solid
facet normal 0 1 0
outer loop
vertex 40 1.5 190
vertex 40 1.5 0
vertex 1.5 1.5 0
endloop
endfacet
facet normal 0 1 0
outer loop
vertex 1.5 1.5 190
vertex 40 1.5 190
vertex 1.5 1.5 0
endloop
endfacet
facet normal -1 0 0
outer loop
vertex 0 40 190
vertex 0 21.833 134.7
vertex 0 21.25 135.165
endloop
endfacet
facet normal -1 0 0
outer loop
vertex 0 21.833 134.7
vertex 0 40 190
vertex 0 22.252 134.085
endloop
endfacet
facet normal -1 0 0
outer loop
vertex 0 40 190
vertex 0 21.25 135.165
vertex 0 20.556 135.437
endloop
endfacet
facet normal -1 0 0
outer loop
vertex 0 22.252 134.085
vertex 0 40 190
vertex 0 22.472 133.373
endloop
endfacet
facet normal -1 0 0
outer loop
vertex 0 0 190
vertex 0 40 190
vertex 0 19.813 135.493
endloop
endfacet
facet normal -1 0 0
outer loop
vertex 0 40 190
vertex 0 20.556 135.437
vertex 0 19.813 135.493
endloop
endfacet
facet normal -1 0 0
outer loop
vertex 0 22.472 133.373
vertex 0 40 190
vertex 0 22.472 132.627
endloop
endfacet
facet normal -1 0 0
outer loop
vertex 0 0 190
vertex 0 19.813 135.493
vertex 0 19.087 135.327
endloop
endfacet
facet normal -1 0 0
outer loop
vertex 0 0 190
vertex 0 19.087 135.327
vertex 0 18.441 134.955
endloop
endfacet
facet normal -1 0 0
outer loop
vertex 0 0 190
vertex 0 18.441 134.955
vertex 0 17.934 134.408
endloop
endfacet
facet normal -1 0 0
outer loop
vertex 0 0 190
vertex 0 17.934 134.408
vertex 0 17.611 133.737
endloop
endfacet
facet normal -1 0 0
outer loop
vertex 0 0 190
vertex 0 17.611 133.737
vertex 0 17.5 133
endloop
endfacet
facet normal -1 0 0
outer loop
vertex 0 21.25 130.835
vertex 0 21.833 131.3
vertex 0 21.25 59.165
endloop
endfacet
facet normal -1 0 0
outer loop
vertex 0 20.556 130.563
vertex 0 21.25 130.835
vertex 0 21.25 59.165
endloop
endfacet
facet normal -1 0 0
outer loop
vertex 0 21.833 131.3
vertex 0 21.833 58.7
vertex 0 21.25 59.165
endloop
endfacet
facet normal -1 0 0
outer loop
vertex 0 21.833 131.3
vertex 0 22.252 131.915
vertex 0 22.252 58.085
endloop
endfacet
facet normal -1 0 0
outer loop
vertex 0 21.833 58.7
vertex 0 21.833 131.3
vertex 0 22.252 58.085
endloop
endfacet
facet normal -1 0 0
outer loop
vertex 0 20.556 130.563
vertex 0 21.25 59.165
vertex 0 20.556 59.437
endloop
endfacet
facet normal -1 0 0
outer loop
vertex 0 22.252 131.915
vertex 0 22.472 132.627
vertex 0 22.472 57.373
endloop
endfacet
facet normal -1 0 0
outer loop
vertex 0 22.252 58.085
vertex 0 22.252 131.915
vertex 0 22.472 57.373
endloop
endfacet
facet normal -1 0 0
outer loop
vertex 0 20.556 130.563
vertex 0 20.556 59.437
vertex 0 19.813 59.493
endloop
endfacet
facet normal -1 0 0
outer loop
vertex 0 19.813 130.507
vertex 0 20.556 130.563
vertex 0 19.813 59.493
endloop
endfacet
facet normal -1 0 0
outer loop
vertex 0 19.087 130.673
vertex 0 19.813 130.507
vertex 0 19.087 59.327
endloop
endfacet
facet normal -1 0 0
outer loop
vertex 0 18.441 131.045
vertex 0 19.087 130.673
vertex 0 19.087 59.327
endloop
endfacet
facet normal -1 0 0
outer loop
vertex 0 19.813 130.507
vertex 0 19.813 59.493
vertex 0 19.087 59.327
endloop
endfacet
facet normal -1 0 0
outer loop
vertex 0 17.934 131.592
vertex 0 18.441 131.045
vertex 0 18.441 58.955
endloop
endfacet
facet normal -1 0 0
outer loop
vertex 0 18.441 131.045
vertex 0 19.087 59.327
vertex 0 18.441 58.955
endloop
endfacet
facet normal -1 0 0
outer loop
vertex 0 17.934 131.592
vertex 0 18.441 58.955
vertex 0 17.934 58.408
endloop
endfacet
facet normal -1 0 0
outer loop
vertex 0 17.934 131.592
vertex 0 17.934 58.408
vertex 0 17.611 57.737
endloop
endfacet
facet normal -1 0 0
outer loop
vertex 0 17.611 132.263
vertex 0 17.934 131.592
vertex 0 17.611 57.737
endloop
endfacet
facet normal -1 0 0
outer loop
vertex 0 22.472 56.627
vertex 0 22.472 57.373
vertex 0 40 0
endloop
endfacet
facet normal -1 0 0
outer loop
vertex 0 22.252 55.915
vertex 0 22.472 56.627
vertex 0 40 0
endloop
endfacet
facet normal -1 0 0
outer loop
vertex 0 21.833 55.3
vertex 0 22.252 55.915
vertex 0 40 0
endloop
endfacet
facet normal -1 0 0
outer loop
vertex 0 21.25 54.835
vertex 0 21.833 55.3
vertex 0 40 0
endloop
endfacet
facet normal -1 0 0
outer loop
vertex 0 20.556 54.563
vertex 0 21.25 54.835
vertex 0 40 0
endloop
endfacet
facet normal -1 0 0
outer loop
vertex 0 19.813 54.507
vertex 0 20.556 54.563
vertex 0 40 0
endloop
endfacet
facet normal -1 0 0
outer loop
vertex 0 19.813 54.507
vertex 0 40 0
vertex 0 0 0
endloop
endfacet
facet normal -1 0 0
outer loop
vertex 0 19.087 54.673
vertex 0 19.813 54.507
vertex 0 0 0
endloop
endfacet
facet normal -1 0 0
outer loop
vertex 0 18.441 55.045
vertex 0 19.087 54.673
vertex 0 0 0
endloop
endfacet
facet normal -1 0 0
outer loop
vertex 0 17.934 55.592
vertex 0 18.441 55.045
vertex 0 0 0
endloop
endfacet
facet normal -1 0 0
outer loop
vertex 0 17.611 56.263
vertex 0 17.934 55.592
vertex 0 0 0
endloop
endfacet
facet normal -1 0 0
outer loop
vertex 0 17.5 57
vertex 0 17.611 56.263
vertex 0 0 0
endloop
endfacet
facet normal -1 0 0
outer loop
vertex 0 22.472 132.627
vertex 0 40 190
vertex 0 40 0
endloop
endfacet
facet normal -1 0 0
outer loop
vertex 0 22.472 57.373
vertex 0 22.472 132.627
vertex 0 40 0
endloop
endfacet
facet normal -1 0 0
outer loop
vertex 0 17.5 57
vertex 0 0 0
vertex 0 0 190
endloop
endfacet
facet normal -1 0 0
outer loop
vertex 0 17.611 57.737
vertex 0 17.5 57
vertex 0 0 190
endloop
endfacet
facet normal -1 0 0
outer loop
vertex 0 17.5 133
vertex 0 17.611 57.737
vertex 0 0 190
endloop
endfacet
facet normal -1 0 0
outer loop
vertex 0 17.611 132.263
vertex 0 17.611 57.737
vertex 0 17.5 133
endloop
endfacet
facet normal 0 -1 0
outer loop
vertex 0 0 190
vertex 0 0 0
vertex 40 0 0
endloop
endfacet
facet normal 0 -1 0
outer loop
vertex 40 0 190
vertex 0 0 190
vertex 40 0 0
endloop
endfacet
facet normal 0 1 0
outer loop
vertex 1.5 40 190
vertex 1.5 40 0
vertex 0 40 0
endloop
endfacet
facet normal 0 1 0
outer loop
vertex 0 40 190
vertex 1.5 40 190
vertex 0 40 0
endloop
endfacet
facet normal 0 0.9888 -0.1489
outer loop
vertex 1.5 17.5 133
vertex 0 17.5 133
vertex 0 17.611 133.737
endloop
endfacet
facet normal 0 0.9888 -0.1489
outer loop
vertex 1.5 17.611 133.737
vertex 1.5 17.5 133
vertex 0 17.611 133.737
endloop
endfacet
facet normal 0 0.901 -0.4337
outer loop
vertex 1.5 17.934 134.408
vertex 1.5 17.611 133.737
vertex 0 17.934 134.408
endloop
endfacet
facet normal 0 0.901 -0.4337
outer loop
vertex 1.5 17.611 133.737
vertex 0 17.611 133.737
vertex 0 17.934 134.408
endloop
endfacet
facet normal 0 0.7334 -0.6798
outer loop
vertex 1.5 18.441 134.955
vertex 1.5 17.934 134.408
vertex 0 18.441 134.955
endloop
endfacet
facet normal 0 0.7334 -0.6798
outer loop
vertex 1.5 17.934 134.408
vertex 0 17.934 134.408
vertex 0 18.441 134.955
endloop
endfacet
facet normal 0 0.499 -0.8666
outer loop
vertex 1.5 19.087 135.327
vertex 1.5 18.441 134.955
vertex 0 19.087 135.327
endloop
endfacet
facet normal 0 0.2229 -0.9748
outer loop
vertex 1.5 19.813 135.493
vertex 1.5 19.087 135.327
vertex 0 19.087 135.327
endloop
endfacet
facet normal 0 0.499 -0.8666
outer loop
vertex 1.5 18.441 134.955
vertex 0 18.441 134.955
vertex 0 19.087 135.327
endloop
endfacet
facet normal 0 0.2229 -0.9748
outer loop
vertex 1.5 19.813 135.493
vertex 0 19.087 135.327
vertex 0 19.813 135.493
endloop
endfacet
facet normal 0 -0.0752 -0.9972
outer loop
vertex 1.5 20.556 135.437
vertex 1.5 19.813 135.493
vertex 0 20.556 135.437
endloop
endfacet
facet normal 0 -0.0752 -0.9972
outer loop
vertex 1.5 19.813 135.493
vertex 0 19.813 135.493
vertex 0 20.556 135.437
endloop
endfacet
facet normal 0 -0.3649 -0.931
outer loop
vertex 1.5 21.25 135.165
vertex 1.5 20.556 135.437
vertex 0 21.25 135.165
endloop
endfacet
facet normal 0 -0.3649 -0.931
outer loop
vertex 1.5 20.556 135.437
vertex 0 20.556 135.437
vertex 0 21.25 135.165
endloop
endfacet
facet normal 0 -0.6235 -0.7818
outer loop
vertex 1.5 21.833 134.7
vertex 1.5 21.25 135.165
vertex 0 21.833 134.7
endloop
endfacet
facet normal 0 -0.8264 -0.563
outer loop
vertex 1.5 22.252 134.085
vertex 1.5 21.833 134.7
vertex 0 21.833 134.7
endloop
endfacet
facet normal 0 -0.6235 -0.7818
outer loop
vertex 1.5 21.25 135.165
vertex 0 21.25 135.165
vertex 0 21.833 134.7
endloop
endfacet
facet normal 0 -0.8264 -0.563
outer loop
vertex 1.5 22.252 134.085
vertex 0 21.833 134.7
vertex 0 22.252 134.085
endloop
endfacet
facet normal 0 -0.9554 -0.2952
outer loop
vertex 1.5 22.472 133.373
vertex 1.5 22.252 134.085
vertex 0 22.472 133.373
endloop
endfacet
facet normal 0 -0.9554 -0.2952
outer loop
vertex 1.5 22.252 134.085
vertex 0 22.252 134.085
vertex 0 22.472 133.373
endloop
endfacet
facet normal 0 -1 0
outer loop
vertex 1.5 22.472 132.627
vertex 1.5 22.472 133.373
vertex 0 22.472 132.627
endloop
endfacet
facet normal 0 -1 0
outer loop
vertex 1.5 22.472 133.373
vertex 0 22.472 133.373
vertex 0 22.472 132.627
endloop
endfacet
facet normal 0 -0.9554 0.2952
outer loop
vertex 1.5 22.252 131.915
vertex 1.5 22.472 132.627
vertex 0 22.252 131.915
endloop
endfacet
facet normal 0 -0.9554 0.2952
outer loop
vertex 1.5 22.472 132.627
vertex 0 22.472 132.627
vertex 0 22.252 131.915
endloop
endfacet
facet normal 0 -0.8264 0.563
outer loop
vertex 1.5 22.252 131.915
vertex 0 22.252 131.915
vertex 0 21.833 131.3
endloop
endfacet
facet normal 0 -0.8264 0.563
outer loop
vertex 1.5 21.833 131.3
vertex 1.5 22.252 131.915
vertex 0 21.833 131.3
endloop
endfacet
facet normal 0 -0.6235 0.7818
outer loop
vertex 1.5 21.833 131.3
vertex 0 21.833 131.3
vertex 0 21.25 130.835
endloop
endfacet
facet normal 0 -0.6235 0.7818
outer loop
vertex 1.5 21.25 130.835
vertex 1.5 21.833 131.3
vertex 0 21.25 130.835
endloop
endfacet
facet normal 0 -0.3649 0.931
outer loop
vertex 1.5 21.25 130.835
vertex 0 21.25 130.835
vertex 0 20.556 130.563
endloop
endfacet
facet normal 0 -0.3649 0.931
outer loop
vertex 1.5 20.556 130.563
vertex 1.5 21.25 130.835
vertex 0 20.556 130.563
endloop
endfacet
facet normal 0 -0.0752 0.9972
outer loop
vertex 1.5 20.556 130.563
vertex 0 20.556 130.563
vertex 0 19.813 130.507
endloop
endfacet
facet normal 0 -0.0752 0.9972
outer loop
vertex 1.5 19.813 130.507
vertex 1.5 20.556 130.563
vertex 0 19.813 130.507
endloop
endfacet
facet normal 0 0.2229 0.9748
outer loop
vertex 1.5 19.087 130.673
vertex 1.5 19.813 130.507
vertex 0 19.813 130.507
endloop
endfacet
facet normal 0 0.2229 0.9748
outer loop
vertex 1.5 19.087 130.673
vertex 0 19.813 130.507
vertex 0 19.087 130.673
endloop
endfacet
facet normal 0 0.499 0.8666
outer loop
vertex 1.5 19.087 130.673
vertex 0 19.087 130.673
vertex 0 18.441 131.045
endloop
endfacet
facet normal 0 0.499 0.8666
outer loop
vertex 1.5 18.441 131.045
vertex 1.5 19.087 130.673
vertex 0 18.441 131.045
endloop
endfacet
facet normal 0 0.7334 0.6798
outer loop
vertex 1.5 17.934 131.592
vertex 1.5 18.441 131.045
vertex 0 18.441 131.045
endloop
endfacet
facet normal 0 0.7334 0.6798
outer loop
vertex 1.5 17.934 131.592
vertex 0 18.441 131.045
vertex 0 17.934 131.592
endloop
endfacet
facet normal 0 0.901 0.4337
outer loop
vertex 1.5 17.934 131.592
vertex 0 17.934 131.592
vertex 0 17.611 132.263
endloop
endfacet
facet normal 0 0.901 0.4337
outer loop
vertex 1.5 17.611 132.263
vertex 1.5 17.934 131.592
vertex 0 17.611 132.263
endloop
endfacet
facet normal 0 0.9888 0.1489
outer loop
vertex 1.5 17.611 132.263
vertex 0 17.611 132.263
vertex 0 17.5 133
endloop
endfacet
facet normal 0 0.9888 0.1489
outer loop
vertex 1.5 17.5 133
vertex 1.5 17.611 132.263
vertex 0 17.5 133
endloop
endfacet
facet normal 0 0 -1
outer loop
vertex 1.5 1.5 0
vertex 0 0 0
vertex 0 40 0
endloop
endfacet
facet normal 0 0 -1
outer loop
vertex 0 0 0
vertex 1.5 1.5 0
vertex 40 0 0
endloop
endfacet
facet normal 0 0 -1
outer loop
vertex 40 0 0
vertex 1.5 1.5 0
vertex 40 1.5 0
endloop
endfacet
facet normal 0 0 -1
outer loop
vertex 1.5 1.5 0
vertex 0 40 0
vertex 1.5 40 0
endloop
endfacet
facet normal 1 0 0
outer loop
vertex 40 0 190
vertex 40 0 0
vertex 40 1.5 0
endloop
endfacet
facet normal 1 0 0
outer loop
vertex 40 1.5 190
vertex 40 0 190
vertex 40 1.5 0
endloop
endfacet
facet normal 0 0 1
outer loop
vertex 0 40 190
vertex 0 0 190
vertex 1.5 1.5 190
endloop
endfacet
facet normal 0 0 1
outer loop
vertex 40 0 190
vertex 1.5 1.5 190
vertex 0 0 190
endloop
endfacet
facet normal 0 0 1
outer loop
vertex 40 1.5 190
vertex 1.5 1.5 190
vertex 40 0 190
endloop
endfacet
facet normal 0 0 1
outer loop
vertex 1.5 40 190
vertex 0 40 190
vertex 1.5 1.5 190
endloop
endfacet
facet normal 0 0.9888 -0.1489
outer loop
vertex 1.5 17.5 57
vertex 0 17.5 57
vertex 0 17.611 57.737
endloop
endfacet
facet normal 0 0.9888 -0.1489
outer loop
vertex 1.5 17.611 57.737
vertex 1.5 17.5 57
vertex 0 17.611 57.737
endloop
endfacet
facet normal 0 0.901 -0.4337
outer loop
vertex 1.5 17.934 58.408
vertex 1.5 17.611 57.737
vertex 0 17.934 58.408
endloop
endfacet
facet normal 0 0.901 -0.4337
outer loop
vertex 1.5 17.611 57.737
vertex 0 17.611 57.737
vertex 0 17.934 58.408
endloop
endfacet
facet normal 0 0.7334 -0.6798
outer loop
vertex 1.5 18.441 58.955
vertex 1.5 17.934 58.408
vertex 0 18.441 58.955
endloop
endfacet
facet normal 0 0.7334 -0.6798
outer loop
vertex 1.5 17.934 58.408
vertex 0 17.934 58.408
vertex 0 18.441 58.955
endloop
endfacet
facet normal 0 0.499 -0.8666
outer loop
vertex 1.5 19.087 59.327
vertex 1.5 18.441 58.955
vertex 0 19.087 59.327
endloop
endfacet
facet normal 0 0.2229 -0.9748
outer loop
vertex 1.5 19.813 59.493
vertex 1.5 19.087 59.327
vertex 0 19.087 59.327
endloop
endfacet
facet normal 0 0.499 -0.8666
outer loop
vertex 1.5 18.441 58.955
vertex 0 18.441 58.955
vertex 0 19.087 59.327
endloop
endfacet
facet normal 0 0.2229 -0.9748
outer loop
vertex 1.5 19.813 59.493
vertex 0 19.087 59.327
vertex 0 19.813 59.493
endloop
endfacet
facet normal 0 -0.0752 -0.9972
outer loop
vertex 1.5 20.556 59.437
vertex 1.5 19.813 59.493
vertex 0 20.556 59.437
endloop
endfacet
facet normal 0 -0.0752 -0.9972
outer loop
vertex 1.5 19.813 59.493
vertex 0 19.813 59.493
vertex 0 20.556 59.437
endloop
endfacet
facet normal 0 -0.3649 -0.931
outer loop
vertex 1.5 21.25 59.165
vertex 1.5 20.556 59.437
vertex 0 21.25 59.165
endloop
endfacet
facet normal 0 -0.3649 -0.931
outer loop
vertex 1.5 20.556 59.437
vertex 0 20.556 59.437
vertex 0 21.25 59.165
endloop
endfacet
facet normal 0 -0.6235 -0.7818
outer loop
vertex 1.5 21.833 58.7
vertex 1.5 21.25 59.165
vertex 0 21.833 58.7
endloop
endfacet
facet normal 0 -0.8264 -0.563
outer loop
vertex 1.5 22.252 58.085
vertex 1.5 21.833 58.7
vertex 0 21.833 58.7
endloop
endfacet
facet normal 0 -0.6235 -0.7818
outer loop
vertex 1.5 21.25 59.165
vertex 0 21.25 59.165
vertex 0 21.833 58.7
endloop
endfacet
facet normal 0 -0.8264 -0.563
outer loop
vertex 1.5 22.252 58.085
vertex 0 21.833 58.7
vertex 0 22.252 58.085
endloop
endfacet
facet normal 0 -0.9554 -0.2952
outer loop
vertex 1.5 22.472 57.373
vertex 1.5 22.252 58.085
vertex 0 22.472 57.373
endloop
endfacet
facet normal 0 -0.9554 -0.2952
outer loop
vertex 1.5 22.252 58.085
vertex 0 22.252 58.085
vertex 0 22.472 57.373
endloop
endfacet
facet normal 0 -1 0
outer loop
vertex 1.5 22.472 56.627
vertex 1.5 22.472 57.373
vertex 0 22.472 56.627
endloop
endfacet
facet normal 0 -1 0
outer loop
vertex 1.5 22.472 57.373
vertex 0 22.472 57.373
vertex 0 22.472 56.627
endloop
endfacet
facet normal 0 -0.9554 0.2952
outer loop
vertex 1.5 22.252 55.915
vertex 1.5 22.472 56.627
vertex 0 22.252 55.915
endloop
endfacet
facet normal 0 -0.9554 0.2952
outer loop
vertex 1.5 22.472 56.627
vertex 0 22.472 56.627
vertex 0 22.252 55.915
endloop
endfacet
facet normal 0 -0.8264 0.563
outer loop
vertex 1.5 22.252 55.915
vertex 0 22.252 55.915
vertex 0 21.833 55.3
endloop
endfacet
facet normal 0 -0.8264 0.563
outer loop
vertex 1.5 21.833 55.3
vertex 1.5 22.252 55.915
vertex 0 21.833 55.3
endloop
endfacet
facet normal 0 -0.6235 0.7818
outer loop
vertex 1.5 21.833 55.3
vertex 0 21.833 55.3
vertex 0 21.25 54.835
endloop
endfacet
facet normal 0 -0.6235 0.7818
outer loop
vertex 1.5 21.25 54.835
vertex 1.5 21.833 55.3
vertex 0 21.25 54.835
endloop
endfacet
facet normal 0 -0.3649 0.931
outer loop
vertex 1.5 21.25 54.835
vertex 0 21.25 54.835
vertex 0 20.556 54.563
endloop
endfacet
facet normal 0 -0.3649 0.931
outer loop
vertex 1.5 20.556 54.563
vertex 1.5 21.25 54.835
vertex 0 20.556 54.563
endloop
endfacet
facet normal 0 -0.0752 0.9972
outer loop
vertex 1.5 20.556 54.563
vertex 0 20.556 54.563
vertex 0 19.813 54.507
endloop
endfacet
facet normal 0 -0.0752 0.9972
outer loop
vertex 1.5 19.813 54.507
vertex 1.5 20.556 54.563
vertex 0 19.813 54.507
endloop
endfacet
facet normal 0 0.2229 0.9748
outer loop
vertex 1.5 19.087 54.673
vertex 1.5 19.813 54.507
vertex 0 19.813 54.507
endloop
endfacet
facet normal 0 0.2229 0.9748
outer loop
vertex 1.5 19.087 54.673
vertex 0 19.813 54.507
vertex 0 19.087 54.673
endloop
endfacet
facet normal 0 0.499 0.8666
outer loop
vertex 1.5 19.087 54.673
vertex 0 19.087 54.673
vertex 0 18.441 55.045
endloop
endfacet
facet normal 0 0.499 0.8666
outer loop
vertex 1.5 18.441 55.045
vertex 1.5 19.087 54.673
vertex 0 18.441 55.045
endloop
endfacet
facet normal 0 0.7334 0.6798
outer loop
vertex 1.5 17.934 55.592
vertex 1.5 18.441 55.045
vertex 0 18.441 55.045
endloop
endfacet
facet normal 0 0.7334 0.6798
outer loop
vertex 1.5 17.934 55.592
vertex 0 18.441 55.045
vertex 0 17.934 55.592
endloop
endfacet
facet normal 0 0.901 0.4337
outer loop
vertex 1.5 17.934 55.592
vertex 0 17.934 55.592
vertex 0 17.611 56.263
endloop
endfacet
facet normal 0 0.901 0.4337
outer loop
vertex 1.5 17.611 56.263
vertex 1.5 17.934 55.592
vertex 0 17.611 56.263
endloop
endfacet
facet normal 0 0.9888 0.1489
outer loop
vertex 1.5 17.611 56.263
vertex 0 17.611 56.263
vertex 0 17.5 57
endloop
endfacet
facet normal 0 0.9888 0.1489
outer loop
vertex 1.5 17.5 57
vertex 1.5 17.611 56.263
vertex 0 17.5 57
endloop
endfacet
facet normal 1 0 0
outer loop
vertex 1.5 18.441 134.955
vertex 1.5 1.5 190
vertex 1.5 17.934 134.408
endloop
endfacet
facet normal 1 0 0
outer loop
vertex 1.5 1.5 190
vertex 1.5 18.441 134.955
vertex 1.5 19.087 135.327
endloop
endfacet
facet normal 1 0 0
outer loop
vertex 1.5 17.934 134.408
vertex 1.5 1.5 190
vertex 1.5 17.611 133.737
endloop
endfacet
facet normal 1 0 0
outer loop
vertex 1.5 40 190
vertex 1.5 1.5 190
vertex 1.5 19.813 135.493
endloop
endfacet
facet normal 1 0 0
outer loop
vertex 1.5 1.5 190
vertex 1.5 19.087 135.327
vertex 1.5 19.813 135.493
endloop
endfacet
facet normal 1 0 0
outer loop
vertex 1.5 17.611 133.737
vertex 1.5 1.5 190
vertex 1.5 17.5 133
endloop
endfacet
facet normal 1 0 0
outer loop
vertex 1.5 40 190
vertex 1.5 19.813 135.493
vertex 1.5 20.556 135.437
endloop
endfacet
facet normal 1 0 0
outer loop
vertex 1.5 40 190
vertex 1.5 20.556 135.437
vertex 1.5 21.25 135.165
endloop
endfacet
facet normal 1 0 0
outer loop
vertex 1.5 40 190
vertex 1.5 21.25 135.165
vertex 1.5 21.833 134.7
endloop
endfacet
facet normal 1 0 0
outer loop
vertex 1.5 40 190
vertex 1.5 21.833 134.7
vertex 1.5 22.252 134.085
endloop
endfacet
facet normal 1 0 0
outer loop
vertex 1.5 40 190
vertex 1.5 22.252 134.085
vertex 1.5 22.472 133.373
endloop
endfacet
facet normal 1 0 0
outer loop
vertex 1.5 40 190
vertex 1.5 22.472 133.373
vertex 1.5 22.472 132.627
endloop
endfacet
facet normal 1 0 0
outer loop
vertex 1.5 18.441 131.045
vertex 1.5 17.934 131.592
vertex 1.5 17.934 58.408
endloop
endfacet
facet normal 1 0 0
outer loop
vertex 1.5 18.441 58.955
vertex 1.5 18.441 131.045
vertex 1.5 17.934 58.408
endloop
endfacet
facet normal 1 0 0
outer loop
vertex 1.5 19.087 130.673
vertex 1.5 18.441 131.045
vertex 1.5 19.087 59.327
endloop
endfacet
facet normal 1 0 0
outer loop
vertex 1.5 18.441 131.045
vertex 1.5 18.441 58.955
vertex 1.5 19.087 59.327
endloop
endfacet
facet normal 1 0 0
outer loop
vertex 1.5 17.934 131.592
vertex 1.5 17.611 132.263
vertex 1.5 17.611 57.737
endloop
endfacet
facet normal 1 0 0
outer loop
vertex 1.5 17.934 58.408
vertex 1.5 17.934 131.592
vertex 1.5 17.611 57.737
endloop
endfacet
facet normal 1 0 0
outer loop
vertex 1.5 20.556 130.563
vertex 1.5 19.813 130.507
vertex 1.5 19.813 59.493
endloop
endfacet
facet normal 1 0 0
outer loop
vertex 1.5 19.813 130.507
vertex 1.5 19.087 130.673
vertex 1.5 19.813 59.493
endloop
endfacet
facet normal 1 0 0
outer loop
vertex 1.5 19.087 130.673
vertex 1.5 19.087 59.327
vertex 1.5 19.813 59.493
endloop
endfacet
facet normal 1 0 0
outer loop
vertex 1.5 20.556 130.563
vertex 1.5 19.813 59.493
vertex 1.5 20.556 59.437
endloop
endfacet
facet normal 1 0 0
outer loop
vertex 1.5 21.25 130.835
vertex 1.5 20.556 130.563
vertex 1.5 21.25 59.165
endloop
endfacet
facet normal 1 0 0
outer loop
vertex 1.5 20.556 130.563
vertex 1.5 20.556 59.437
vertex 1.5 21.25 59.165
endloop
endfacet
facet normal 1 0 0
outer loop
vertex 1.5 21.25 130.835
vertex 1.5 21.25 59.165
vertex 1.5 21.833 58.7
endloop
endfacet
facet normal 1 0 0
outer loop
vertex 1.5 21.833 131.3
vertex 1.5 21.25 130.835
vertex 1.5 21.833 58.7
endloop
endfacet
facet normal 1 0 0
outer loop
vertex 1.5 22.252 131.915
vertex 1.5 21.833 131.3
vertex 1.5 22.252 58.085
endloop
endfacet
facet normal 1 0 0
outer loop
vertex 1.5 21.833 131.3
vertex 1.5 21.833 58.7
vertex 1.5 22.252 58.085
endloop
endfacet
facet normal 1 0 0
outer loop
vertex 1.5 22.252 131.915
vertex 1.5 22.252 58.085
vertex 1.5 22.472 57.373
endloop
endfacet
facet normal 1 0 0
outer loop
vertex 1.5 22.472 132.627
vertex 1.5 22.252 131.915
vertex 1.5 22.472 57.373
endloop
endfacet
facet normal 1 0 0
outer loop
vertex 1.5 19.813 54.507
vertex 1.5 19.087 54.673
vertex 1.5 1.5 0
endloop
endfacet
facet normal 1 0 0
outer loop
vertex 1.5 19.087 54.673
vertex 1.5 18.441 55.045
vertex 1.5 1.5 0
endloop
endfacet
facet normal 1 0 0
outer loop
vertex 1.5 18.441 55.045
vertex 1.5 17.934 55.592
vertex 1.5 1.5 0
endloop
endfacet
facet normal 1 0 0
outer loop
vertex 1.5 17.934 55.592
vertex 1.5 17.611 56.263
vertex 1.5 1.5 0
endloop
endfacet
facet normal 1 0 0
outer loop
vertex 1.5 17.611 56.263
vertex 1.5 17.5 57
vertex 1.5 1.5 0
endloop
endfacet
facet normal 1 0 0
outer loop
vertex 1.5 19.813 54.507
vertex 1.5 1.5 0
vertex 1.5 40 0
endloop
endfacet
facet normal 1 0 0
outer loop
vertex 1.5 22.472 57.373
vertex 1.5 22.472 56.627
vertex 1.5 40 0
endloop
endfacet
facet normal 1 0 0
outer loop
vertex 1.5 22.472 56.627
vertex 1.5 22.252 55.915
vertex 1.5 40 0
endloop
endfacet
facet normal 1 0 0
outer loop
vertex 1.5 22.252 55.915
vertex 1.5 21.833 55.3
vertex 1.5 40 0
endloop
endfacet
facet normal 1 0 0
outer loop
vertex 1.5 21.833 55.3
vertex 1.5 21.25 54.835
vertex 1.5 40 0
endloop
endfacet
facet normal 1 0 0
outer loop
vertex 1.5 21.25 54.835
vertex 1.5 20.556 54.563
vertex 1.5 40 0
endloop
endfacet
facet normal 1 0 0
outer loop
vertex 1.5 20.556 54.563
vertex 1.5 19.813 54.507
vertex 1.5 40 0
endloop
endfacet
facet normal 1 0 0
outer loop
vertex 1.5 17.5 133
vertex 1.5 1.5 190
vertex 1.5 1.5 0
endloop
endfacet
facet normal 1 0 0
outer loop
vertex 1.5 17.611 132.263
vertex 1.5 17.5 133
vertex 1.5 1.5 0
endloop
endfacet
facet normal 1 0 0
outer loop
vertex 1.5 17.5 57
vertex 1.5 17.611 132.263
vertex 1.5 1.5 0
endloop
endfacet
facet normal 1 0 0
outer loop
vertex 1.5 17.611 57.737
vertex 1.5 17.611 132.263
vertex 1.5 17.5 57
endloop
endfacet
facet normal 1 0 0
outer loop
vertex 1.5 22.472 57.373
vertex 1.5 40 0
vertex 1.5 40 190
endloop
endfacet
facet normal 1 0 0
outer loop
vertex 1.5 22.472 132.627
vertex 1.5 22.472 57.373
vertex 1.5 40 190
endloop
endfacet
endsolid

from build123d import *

# Parameters (mm, degrees)
EXTRU_MINCE1_DEPTH      = 190
ESQUISSE2_R             = 2.5
ENL_V_MAT_EXTRU_1_DEPTH = 199.242276016


with BuildPart() as part:
    # Esquisse1 → Extru.-Mince1 (new body)
    with BuildSketch(Plane.XY):
        Polygon((0, 40), (0, 0), (40, 0), (40, 1.5), (1.5, 1.5), (1.5, 40), align=None)
    extrude(amount=EXTRU_MINCE1_DEPTH)

    # Esquisse2 → Enlèv. mat.-Extru.1 (cut, through all)
    with BuildSketch(Plane.ZY):
        with Locations(Location((57, 20, 0), (0, 0, 270))):
            Circle(ESQUISSE2_R)
        with Locations(Location((133, 20, 0), (0, 0, 270))):
            Circle(ESQUISSE2_R)
    extrude(amount=-ENL_V_MAT_EXTRU_1_DEPTH, mode=Mode.SUBTRACT)


solid = part.part
